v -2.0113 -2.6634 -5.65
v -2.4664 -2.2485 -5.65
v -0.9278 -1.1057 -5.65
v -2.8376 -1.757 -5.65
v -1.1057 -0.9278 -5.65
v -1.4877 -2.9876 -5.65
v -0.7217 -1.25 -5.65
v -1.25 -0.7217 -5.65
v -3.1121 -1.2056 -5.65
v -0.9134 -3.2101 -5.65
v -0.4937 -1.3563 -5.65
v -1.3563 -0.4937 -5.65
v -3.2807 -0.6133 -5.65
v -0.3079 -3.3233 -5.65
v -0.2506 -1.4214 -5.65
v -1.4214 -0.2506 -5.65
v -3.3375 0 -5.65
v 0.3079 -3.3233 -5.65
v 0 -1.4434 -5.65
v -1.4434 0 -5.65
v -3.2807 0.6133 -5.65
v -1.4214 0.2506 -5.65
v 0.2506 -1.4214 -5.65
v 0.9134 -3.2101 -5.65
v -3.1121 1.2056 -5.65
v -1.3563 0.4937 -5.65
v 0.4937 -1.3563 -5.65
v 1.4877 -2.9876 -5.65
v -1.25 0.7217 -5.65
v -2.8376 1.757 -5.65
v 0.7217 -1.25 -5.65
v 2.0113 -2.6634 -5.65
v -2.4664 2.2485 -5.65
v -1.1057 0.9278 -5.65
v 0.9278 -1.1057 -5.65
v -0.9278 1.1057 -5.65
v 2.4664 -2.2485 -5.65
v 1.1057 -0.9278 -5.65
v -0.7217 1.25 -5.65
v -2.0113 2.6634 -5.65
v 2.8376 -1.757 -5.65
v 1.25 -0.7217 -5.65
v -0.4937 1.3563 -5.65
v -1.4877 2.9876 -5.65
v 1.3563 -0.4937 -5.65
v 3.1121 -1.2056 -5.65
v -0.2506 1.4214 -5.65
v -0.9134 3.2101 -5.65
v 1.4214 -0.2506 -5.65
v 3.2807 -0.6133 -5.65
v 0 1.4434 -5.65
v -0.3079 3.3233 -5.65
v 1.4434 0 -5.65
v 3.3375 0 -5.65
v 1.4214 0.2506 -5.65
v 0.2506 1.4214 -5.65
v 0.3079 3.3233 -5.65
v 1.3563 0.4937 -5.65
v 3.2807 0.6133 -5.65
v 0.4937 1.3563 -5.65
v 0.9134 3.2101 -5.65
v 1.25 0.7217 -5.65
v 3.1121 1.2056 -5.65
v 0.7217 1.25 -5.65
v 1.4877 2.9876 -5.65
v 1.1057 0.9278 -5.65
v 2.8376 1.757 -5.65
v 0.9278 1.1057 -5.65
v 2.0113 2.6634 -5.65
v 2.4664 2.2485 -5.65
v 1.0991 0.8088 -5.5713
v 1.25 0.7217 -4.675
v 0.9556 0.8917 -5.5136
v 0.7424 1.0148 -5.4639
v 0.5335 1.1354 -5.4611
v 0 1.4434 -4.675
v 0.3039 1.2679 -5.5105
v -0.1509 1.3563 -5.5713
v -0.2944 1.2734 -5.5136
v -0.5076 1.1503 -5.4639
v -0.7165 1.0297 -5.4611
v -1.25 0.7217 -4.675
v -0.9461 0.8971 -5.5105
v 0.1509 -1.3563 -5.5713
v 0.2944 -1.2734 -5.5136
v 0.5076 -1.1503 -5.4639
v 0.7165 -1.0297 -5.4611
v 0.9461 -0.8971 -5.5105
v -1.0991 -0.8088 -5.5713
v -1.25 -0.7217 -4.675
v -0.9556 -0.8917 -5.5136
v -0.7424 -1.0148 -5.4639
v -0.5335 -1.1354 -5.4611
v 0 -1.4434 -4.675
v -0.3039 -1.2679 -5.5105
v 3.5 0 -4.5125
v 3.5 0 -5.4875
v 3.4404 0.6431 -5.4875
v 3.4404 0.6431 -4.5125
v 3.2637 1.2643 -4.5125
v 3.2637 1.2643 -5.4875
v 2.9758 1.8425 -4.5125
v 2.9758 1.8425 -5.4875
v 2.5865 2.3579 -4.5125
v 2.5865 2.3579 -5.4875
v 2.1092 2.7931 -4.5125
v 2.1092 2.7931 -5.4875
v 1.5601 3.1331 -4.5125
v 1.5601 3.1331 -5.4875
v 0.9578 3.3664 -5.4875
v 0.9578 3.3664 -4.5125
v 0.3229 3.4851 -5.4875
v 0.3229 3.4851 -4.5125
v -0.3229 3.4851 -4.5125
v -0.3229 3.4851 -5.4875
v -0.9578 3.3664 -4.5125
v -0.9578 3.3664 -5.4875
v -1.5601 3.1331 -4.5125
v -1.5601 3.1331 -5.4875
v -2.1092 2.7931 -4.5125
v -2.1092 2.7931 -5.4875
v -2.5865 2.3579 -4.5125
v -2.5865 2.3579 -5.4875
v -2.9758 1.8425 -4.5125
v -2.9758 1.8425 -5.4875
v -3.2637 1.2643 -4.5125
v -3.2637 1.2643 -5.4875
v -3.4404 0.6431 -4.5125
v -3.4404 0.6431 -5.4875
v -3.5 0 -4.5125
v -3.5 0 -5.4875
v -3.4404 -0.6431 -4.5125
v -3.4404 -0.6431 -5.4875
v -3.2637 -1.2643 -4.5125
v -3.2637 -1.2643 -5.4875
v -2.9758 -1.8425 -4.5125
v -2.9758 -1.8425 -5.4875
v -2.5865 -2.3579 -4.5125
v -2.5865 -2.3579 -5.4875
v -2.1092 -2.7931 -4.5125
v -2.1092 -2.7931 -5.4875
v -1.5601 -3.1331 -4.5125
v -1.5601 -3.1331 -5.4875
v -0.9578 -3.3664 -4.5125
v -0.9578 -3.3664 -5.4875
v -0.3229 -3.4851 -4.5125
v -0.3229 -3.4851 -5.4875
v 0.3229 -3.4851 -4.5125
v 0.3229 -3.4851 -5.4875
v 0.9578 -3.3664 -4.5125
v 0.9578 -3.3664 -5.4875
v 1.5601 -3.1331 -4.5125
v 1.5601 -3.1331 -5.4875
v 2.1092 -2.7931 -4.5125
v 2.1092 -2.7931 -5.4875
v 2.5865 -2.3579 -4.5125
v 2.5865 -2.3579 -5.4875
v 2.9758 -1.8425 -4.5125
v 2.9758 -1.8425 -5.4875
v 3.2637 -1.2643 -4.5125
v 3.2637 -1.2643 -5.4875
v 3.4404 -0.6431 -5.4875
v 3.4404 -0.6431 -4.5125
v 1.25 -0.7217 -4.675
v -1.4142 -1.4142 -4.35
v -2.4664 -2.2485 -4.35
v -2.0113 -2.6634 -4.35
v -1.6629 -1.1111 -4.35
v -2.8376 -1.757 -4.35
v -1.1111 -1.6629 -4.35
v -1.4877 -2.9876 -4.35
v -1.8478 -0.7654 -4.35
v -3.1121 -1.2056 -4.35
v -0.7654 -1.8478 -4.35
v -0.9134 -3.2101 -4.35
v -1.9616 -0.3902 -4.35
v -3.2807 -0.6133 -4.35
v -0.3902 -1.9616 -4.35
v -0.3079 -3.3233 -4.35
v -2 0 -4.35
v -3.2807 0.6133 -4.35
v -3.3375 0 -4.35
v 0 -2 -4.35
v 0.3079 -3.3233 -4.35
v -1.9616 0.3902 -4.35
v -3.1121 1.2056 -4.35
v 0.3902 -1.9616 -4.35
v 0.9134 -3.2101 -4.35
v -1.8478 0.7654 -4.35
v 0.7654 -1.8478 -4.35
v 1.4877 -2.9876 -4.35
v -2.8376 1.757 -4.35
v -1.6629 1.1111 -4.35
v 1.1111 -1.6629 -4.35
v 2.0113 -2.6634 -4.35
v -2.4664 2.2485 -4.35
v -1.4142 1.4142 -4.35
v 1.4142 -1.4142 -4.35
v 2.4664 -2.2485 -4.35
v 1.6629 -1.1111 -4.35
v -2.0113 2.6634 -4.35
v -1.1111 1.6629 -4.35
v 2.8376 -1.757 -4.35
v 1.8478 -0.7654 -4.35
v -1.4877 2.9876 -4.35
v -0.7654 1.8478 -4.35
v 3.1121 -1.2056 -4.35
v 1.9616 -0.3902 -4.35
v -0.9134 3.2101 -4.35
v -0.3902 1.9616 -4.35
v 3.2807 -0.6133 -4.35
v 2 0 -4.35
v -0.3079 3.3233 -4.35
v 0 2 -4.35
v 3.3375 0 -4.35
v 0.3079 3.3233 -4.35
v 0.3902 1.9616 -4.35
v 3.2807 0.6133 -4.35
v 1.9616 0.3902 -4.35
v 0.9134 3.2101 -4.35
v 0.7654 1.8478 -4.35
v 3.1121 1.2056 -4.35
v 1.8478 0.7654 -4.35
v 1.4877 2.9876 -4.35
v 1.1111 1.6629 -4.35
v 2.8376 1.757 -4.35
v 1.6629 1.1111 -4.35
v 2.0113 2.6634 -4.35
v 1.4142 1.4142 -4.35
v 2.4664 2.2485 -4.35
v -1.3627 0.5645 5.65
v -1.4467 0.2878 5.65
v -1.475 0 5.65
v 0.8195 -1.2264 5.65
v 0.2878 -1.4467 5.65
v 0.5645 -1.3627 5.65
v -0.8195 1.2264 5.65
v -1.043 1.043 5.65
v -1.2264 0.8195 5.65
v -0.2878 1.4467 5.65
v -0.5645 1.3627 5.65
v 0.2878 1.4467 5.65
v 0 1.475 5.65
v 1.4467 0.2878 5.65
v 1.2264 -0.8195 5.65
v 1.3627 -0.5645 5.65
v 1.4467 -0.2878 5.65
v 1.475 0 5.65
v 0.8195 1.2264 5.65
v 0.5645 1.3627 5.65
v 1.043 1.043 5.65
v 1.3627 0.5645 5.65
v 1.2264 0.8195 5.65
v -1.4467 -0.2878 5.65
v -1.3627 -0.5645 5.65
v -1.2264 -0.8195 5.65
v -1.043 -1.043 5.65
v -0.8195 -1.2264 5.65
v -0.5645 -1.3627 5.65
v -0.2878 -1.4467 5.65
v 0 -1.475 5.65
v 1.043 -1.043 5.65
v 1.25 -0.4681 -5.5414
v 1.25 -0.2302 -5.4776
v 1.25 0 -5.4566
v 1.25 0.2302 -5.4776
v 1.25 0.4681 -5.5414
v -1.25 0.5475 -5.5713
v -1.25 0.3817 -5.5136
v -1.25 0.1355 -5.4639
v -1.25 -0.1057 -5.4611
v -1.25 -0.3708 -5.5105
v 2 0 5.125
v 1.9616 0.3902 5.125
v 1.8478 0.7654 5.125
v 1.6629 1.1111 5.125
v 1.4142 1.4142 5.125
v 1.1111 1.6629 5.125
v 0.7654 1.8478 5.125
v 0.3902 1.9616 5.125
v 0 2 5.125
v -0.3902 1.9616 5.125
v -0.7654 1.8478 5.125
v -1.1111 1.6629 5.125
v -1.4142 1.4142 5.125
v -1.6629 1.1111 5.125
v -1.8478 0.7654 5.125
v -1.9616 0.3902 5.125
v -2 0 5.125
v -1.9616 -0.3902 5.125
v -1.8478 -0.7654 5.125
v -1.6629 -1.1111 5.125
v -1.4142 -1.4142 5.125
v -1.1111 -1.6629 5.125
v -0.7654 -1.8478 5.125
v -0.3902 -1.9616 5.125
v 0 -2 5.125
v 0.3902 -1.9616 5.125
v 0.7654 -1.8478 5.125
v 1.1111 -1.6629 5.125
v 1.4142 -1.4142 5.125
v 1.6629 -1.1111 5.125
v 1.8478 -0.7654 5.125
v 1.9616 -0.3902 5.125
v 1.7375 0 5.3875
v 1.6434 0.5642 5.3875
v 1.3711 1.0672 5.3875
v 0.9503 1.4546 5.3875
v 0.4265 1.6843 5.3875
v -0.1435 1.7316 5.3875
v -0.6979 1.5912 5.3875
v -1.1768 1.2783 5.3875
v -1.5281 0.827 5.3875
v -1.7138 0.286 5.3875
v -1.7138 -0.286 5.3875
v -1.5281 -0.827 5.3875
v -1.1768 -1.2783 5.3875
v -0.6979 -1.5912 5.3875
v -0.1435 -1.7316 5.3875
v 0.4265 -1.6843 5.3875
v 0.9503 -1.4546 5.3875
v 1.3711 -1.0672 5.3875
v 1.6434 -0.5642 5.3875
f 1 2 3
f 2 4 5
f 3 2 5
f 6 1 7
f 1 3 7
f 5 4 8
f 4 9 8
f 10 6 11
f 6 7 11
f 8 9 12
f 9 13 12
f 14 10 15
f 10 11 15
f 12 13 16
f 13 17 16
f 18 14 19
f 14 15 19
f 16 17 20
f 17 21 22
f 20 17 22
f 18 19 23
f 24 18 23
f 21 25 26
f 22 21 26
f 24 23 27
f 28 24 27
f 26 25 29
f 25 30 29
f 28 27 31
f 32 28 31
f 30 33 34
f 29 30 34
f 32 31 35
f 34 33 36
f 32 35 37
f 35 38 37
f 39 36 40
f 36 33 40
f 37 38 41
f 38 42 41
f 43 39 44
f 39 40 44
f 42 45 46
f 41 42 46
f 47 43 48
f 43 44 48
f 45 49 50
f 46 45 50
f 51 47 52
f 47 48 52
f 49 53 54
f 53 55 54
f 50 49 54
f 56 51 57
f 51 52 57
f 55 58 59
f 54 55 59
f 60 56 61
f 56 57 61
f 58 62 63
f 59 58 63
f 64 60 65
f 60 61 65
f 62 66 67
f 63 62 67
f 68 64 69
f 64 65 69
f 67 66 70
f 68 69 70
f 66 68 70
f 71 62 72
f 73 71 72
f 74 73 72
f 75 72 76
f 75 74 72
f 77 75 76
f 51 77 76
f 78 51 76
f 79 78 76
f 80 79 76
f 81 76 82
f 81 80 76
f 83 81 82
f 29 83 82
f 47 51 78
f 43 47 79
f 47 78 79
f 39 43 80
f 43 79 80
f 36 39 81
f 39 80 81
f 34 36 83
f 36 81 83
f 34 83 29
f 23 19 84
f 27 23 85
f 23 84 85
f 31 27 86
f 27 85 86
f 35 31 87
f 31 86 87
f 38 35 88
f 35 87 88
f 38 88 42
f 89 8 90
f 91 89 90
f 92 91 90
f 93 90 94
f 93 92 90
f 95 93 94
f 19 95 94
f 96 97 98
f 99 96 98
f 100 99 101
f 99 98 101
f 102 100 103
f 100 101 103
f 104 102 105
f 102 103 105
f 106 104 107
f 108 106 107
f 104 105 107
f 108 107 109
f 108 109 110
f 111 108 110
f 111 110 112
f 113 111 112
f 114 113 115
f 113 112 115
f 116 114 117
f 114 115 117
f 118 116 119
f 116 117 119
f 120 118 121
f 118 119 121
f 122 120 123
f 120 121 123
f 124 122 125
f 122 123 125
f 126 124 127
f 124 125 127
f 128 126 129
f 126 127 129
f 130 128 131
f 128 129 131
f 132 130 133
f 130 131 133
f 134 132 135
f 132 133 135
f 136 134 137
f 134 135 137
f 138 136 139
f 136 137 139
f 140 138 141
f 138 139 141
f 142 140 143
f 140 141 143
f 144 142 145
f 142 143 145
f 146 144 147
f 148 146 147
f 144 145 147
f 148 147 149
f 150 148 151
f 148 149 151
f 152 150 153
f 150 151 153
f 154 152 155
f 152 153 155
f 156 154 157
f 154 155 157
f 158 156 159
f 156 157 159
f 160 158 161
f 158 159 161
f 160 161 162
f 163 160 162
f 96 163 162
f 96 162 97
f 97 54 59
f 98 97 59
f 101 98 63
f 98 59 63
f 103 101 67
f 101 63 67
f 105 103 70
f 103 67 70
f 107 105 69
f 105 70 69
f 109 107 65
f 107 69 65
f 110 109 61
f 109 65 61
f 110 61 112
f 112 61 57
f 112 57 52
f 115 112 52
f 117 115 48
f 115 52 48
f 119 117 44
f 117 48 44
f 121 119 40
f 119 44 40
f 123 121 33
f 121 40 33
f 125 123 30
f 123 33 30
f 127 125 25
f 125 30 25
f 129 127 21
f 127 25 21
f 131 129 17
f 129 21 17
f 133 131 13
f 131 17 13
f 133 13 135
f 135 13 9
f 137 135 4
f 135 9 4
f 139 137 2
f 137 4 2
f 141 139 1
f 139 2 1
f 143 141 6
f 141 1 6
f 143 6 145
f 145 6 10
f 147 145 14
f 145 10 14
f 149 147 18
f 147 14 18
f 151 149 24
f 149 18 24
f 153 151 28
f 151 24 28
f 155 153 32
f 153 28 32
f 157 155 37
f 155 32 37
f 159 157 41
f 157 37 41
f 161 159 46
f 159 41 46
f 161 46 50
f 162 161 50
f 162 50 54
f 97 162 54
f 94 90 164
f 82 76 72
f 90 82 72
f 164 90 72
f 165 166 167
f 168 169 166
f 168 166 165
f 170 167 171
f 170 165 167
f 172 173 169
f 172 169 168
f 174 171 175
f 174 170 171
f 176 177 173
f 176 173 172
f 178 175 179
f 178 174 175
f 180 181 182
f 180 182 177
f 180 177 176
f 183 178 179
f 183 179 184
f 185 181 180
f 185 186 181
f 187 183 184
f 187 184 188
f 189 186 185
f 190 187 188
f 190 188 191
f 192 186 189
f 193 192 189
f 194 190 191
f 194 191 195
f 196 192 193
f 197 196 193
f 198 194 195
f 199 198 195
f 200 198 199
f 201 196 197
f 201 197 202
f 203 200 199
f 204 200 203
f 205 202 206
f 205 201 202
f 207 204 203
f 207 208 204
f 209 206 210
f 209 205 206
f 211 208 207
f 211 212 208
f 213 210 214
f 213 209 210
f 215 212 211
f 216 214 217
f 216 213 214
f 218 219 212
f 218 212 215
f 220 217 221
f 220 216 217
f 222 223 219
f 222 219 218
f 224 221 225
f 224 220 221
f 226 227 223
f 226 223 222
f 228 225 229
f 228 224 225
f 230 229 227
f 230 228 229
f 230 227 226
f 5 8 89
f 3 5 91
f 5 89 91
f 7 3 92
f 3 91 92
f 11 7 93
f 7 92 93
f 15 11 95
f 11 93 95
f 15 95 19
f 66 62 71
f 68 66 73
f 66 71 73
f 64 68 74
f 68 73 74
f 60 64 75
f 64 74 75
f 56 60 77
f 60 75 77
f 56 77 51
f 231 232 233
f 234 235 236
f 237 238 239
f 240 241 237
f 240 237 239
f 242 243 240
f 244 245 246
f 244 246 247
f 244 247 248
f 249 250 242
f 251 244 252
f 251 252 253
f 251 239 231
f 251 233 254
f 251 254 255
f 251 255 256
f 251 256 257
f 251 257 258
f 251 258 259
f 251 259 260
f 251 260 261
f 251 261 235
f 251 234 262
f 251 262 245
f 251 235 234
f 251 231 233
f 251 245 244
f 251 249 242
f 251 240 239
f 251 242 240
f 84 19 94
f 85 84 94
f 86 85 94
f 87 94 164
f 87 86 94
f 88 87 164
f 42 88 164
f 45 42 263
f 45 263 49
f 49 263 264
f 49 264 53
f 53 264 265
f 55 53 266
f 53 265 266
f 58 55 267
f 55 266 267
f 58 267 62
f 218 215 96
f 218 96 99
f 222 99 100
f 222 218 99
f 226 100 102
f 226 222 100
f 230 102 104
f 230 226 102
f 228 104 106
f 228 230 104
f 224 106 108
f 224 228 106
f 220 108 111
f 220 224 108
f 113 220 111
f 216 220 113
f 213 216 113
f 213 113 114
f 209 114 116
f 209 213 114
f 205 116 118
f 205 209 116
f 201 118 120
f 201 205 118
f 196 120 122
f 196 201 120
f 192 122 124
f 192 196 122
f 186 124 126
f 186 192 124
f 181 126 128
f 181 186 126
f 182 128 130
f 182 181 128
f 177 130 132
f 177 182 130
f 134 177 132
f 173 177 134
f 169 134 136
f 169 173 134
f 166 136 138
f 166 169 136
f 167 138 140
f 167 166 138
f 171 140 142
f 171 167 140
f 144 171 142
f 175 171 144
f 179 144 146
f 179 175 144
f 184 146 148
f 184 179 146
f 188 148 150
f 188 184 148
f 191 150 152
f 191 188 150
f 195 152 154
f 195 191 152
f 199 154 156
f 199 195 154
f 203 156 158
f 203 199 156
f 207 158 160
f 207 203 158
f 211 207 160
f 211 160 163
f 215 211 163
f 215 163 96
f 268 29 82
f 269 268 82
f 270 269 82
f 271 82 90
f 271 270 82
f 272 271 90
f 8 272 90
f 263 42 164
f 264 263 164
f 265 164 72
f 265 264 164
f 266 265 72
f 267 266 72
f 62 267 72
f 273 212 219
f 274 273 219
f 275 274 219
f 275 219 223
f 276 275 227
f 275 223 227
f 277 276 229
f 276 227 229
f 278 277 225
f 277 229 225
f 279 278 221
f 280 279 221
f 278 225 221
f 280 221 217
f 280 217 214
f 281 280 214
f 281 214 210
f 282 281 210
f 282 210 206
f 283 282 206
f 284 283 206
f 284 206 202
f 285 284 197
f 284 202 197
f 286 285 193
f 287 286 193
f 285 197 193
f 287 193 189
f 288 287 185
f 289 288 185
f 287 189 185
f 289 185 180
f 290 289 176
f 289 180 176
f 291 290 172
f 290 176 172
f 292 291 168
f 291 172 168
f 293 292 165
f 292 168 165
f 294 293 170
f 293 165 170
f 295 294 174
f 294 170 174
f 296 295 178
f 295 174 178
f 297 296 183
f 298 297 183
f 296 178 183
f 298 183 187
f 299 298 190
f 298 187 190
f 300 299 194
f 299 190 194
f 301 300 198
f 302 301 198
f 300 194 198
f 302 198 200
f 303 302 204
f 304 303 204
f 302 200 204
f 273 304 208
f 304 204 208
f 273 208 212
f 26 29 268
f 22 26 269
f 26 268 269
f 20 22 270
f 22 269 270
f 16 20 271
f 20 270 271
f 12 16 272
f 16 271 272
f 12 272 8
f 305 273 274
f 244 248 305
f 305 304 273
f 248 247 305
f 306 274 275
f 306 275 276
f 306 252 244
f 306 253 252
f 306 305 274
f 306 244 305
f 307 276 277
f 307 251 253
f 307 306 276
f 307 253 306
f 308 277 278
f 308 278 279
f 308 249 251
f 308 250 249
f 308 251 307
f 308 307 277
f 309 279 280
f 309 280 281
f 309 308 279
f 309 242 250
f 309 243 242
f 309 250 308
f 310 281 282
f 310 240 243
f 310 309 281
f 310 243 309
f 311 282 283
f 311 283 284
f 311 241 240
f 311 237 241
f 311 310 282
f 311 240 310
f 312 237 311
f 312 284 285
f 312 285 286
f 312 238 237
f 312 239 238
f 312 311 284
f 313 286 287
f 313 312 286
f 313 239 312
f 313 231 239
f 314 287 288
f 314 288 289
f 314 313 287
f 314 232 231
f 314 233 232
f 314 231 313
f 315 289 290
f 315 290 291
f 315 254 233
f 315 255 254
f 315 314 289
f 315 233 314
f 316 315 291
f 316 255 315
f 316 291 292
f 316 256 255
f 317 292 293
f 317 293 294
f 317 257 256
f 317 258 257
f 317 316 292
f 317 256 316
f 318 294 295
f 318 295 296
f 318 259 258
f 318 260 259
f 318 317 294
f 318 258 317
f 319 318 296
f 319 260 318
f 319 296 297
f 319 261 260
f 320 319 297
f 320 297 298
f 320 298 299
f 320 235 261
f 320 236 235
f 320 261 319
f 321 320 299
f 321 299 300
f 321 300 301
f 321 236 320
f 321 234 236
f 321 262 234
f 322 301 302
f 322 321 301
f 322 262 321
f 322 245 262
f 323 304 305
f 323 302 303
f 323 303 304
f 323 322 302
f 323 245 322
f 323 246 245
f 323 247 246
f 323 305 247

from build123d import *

# Parameters (mm, degrees)
EXTRUDE1_START     = -4.35
SKETCH1_R          = 2
EXTRUDE1_DEPTH     = 10
EXTRUDE2_START     = -5.65
SKETCH6_R          = 3.5
EXTRUDE2_DEPTH     = 1.3
CUT_EXTRUDE1_DEPTH = 0.975
SKETCH8_R          = 1.443375673
CUT_EXTRUDE2_DEPTH = 0.975
CUT_EXTRUDE2_TAPER = 45
CHAMFER1_SIZE      = 0.1625
CHAMFER2_SIZE      = 0.525


with BuildPart() as part:
    # Sketch1 → Extrude1 (new body)
    with BuildSketch(Plane.XY.offset(EXTRUDE1_START)):
        Circle(SKETCH1_R)
    extrude(amount=EXTRUDE1_DEPTH)

    # Sketch6 → Extrude2 (add)
    with BuildSketch(Plane.XY.offset(EXTRUDE2_START)):
        Circle(SKETCH6_R)
    extrude(amount=EXTRUDE2_DEPTH)

    # Sketch7 → Cut-Extrude1 (cut)
    with BuildSketch(Plane.XY.offset(-5.65)):
        Polygon((0, 1.443375673), (-1.25, 0.721687836), (-1.25, -0.721687836), (0, -1.443375673), (1.25, -0.721687836), (1.25, 0.721687836), align=None)
    extrude(amount=CUT_EXTRUDE1_DEPTH, mode=Mode.SUBTRACT)

    # Sketch8 → Cut-Extrude2 (cut)
    with BuildSketch(Plane.XY.offset(-5.65)):
        Circle(SKETCH8_R)
    extrude(amount=CUT_EXTRUDE2_DEPTH, taper=CUT_EXTRUDE2_TAPER, mode=Mode.SUBTRACT)

    # Chamfer1
    chamfer1_edges = [part.edges().sort_by_distance(p)[0] for p in [
        (-3.5, 0, -4.35),
        (-3.5, 0, -5.65),
    ]]
    chamfer(chamfer1_edges, length=CHAMFER1_SIZE)

    # Chamfer2
    chamfer2_edges = [part.edges().sort_by_distance(p)[0] for p in [
        (-2, 0, 5.65),
    ]]
    chamfer(chamfer2_edges, length=CHAMFER2_SIZE)


solid = part.part
